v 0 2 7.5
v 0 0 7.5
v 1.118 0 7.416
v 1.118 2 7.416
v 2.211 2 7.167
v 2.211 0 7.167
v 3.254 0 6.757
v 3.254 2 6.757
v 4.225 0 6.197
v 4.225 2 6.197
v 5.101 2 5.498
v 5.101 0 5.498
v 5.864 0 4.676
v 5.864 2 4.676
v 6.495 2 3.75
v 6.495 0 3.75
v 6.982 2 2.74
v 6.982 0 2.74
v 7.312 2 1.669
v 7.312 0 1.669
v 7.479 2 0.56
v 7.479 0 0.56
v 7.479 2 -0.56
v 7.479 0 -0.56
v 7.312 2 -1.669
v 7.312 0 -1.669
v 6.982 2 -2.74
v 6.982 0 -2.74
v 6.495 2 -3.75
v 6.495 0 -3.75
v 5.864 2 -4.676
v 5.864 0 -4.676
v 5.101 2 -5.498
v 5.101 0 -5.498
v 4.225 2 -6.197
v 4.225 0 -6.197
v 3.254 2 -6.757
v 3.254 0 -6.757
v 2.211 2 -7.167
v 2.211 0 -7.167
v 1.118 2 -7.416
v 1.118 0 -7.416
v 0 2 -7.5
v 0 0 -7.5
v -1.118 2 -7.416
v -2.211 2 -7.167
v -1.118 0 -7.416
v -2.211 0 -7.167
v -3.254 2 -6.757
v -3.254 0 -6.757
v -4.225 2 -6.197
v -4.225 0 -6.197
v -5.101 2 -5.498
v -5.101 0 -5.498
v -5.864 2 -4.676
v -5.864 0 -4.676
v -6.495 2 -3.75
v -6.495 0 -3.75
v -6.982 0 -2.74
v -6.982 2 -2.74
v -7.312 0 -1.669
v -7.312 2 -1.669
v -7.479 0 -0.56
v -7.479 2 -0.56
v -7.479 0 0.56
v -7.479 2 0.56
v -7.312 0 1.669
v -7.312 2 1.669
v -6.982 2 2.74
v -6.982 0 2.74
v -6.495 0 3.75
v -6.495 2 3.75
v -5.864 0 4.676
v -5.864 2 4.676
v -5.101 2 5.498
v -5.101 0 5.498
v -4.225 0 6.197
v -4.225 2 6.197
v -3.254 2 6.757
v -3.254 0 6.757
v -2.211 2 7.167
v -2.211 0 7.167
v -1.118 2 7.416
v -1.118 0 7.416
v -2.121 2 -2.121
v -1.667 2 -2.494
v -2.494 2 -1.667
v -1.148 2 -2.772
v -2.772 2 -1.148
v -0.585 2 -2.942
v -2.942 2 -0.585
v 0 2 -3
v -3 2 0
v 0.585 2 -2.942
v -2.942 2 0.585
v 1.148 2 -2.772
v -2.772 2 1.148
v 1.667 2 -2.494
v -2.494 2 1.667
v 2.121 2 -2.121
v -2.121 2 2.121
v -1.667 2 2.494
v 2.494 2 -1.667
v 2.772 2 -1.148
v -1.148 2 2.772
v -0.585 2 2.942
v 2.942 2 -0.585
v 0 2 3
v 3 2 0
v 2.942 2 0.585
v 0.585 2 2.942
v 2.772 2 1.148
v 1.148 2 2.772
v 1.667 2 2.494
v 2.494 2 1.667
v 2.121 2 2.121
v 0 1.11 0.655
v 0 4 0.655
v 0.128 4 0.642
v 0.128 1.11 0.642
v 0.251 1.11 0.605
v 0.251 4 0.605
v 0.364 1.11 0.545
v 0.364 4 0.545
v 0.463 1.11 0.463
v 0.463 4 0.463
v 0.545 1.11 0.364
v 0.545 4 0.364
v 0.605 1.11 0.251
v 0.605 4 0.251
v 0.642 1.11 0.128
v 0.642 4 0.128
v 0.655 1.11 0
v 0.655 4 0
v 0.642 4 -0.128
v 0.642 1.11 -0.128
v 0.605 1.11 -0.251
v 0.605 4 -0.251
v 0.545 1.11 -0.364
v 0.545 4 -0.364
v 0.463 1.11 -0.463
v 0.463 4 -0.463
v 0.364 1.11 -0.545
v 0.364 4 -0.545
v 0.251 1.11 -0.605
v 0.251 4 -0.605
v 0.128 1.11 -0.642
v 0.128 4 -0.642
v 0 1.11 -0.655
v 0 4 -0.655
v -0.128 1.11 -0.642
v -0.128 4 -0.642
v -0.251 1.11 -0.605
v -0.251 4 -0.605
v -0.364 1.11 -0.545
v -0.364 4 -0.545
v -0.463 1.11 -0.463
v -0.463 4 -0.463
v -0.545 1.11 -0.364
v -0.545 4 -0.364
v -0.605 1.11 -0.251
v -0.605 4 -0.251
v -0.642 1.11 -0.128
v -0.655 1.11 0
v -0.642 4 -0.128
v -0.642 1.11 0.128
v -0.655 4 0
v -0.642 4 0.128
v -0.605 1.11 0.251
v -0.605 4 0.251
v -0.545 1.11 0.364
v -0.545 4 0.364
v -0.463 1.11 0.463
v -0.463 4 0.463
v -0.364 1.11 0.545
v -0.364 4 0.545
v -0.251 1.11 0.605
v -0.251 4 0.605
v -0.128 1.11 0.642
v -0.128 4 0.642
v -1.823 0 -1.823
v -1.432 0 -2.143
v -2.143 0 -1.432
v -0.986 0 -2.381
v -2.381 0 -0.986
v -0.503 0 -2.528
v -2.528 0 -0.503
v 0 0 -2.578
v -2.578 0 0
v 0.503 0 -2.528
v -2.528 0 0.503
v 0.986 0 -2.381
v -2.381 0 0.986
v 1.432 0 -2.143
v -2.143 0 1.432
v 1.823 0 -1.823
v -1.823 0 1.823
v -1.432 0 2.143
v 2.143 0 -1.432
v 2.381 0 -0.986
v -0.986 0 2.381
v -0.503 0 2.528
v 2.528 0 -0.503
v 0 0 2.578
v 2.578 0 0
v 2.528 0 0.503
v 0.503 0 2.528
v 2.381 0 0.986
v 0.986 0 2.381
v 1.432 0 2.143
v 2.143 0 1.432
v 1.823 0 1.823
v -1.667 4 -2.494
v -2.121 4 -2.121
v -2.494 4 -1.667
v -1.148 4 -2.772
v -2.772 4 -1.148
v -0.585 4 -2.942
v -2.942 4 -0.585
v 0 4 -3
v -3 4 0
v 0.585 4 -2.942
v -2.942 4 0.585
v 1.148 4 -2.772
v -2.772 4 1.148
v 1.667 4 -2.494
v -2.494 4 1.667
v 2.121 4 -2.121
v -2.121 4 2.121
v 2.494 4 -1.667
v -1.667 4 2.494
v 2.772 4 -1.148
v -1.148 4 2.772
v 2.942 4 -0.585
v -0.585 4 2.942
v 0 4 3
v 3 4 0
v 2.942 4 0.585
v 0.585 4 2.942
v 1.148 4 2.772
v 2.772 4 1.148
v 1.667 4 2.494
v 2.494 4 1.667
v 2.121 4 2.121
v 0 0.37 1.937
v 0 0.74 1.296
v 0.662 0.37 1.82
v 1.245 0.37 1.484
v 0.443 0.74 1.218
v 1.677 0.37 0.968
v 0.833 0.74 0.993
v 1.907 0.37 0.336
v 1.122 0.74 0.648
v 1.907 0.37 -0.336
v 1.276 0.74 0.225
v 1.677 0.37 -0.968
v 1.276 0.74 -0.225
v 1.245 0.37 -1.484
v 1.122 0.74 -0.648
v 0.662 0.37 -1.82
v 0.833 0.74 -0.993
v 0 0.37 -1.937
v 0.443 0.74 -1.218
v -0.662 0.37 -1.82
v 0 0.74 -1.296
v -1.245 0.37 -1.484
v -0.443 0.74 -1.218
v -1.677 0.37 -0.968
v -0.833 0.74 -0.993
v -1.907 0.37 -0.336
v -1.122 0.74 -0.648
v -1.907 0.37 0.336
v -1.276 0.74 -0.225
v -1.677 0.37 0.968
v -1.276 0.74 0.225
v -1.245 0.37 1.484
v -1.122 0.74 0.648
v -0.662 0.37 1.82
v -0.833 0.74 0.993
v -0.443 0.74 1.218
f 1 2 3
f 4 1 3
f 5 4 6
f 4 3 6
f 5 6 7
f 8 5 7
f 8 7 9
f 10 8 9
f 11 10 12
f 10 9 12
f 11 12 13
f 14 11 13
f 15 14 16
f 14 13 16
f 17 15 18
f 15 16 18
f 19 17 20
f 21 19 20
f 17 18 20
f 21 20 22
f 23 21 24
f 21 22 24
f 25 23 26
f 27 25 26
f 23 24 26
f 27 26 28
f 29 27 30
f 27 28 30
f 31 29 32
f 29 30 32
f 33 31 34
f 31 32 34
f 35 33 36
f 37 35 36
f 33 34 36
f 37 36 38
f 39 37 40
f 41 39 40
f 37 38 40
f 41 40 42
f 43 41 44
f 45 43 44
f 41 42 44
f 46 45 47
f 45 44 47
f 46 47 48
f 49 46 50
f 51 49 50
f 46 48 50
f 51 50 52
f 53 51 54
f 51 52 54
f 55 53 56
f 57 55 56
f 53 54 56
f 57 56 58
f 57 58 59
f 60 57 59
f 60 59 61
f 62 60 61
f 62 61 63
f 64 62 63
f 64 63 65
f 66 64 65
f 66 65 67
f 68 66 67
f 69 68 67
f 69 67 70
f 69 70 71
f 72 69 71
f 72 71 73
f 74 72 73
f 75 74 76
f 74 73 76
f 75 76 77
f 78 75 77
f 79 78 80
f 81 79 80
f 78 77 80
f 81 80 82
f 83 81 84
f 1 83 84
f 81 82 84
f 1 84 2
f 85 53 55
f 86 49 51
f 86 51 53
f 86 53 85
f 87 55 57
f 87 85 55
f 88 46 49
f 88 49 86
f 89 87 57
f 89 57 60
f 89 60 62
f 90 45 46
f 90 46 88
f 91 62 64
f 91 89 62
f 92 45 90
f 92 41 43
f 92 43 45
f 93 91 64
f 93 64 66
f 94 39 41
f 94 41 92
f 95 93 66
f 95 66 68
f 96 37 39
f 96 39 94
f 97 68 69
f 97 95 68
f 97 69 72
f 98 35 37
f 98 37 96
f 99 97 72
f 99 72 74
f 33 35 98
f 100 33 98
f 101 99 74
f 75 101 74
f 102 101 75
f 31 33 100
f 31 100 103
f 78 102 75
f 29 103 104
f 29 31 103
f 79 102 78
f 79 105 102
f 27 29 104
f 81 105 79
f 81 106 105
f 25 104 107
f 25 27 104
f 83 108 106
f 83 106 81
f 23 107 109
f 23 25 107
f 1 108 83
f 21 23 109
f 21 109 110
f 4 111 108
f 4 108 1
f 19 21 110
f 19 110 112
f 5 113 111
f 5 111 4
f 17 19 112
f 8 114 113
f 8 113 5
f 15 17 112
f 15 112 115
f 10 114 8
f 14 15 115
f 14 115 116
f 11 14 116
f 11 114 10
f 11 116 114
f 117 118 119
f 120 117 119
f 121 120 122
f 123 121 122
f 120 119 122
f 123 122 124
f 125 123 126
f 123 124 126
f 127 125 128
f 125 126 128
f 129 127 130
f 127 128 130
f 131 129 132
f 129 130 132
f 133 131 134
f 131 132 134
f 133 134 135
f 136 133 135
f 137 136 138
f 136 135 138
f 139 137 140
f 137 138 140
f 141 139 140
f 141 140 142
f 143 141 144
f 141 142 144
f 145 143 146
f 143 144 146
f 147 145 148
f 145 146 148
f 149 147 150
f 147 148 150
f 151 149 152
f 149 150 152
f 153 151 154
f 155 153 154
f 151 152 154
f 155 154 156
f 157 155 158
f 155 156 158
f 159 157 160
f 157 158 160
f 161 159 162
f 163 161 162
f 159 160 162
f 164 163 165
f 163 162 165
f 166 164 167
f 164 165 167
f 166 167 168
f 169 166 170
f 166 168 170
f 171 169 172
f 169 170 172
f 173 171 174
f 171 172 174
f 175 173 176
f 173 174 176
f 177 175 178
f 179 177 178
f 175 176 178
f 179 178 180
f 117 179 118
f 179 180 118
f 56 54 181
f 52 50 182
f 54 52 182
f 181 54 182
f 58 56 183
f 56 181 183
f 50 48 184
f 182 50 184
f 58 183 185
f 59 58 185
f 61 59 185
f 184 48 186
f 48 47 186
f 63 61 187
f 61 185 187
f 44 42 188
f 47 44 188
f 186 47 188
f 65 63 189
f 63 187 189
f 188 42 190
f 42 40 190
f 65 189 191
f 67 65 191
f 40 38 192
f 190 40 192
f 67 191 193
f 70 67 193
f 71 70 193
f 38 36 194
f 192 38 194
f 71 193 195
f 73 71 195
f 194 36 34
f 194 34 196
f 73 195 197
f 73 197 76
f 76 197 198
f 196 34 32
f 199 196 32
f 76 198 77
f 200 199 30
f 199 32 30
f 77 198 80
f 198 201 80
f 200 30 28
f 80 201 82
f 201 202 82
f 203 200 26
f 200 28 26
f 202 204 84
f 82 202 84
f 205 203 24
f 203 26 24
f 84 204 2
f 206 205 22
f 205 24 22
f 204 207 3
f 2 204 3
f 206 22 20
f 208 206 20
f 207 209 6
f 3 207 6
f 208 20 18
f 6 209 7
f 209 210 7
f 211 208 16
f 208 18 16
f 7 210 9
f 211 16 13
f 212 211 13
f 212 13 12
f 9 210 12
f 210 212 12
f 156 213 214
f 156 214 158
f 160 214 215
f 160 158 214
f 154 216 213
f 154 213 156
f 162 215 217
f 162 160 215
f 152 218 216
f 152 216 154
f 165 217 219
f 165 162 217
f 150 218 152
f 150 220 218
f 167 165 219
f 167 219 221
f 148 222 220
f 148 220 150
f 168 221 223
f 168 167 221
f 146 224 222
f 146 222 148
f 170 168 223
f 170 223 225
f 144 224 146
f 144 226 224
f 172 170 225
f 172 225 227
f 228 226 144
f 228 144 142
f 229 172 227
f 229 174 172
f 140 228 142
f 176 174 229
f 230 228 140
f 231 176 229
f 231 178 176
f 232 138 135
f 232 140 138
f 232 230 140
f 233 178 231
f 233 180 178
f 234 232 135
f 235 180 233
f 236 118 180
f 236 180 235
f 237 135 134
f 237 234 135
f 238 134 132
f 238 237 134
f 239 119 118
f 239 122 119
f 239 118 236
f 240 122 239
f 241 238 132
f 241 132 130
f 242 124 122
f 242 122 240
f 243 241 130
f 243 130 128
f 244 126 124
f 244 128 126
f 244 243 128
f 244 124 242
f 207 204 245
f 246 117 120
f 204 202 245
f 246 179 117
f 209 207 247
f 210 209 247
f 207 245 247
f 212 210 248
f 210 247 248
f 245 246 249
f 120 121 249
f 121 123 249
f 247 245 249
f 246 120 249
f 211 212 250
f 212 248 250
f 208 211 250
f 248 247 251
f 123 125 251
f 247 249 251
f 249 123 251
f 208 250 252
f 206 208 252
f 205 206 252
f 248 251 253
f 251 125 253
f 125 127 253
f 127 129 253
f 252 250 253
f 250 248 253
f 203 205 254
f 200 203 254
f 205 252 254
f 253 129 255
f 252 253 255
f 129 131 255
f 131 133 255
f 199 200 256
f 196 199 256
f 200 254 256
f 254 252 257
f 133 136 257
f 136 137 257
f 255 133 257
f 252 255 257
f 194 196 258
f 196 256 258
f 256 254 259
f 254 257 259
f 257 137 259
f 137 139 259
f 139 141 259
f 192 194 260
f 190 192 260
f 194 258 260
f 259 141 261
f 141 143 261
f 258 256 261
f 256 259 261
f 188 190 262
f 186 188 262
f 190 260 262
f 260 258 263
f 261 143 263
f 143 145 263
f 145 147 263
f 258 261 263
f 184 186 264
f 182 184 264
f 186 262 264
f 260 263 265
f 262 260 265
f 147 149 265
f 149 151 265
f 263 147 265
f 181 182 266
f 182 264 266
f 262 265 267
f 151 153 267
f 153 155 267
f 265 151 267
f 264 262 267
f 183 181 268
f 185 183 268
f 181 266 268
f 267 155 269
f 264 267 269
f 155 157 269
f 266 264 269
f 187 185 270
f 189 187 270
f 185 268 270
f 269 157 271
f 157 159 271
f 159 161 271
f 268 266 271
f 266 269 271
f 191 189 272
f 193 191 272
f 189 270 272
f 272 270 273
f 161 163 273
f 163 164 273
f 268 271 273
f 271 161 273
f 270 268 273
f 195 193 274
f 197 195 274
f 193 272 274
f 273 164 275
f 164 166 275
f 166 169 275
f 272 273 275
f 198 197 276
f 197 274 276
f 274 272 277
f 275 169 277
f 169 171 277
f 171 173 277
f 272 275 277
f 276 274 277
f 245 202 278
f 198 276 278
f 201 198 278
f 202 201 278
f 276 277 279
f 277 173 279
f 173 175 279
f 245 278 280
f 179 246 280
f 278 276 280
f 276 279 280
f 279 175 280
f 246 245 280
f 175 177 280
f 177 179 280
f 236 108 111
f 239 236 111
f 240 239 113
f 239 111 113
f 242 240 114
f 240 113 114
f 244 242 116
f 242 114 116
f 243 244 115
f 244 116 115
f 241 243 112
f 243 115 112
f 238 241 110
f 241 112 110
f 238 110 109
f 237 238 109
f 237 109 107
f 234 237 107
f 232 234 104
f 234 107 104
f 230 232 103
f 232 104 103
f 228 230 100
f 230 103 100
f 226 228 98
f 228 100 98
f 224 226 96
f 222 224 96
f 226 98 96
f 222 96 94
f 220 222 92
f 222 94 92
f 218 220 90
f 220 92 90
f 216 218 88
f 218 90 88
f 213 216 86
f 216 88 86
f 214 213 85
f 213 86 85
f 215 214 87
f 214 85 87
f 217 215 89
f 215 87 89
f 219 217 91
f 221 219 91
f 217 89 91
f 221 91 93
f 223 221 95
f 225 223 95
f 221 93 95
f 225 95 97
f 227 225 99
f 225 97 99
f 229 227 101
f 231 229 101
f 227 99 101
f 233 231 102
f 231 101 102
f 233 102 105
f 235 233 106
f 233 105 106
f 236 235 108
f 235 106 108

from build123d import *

# Parameters (mm, degrees)
SKETCH1_R           = 7.5
BOSS_EXTRUDE1_DEPTH = 2
SKETCH2_R           = 3
BOSS_EXTRUDE2_DEPTH = 2
SKETCH3_R           = 0.655
CUT_EXTRUDE1_DEPTH  = 2.89
SKETCH4_R           = 0.655
CUT_EXTRUDE3_DEPTH  = 1.11
CUT_EXTRUDE3_DRAFT  = 60


with BuildPart() as part:
    # Sketch1 → Boss-Extrude1 (new body)
    with BuildSketch(Plane(origin=(0, 0, 0), x_dir=(1, 0, 0), z_dir=(0, 1, 0))):
        with Locations(Location((0, 0, 0), (0, 0, 270))):
            Circle(SKETCH1_R)
    extrude(amount=BOSS_EXTRUDE1_DEPTH)

    # Sketch2 → Boss-Extrude2 (add)
    with BuildSketch(Plane(origin=(0, 2, 0), x_dir=(1, 0, 0), z_dir=(0, 1, 0))):
        with Locations(Location((0, 0, 0), (0, 0, 270))):
            Circle(SKETCH2_R)
    extrude(amount=BOSS_EXTRUDE2_DEPTH)

    # Sketch3 → Cut-Extrude1 (cut)
    with BuildSketch(Plane(origin=(0, 4, 0), x_dir=(1, 0, 0), z_dir=(0, 1, 0))):
        with Locations(Location((0, 0, 0), (0, 0, 270))):
            Circle(SKETCH3_R)
    extrude(amount=-CUT_EXTRUDE1_DEPTH, mode=Mode.SUBTRACT)


with BuildPart() as cut_extrude3_tool:
    # Sketch4 → Cut-Extrude3 (with draft: the straight prism first)
    with BuildSketch(Plane(origin=(0, 1.11, 0), x_dir=(1, 0, 0), z_dir=(0, 1, 0))):
        with Locations(Location((0, 0, 0), (0, 0, 270))):
            Circle(SKETCH4_R)
    extrude(amount=-CUT_EXTRUDE3_DEPTH)
    # Cut-Extrude3: the draft: its side faces are tilted about the plane it starts from
    cut_extrude3_sides = [cut_extrude3_tool.faces().sort_by_distance(p)[0] for p in [
        (0, 0.555, -0.655),
    ]]
    draft(cut_extrude3_sides, Plane(origin=(0, 1.11, 0), x_dir=(1, 0, 0), z_dir=(0, 1, 0)), CUT_EXTRUDE3_DRAFT)


with BuildPart() as part_1:
    add(part.part)

    # Cut-Extrude3: cut by cut_extrude3_tool
    add(cut_extrude3_tool.part, mode=Mode.SUBTRACT)


solid = part_1.part
